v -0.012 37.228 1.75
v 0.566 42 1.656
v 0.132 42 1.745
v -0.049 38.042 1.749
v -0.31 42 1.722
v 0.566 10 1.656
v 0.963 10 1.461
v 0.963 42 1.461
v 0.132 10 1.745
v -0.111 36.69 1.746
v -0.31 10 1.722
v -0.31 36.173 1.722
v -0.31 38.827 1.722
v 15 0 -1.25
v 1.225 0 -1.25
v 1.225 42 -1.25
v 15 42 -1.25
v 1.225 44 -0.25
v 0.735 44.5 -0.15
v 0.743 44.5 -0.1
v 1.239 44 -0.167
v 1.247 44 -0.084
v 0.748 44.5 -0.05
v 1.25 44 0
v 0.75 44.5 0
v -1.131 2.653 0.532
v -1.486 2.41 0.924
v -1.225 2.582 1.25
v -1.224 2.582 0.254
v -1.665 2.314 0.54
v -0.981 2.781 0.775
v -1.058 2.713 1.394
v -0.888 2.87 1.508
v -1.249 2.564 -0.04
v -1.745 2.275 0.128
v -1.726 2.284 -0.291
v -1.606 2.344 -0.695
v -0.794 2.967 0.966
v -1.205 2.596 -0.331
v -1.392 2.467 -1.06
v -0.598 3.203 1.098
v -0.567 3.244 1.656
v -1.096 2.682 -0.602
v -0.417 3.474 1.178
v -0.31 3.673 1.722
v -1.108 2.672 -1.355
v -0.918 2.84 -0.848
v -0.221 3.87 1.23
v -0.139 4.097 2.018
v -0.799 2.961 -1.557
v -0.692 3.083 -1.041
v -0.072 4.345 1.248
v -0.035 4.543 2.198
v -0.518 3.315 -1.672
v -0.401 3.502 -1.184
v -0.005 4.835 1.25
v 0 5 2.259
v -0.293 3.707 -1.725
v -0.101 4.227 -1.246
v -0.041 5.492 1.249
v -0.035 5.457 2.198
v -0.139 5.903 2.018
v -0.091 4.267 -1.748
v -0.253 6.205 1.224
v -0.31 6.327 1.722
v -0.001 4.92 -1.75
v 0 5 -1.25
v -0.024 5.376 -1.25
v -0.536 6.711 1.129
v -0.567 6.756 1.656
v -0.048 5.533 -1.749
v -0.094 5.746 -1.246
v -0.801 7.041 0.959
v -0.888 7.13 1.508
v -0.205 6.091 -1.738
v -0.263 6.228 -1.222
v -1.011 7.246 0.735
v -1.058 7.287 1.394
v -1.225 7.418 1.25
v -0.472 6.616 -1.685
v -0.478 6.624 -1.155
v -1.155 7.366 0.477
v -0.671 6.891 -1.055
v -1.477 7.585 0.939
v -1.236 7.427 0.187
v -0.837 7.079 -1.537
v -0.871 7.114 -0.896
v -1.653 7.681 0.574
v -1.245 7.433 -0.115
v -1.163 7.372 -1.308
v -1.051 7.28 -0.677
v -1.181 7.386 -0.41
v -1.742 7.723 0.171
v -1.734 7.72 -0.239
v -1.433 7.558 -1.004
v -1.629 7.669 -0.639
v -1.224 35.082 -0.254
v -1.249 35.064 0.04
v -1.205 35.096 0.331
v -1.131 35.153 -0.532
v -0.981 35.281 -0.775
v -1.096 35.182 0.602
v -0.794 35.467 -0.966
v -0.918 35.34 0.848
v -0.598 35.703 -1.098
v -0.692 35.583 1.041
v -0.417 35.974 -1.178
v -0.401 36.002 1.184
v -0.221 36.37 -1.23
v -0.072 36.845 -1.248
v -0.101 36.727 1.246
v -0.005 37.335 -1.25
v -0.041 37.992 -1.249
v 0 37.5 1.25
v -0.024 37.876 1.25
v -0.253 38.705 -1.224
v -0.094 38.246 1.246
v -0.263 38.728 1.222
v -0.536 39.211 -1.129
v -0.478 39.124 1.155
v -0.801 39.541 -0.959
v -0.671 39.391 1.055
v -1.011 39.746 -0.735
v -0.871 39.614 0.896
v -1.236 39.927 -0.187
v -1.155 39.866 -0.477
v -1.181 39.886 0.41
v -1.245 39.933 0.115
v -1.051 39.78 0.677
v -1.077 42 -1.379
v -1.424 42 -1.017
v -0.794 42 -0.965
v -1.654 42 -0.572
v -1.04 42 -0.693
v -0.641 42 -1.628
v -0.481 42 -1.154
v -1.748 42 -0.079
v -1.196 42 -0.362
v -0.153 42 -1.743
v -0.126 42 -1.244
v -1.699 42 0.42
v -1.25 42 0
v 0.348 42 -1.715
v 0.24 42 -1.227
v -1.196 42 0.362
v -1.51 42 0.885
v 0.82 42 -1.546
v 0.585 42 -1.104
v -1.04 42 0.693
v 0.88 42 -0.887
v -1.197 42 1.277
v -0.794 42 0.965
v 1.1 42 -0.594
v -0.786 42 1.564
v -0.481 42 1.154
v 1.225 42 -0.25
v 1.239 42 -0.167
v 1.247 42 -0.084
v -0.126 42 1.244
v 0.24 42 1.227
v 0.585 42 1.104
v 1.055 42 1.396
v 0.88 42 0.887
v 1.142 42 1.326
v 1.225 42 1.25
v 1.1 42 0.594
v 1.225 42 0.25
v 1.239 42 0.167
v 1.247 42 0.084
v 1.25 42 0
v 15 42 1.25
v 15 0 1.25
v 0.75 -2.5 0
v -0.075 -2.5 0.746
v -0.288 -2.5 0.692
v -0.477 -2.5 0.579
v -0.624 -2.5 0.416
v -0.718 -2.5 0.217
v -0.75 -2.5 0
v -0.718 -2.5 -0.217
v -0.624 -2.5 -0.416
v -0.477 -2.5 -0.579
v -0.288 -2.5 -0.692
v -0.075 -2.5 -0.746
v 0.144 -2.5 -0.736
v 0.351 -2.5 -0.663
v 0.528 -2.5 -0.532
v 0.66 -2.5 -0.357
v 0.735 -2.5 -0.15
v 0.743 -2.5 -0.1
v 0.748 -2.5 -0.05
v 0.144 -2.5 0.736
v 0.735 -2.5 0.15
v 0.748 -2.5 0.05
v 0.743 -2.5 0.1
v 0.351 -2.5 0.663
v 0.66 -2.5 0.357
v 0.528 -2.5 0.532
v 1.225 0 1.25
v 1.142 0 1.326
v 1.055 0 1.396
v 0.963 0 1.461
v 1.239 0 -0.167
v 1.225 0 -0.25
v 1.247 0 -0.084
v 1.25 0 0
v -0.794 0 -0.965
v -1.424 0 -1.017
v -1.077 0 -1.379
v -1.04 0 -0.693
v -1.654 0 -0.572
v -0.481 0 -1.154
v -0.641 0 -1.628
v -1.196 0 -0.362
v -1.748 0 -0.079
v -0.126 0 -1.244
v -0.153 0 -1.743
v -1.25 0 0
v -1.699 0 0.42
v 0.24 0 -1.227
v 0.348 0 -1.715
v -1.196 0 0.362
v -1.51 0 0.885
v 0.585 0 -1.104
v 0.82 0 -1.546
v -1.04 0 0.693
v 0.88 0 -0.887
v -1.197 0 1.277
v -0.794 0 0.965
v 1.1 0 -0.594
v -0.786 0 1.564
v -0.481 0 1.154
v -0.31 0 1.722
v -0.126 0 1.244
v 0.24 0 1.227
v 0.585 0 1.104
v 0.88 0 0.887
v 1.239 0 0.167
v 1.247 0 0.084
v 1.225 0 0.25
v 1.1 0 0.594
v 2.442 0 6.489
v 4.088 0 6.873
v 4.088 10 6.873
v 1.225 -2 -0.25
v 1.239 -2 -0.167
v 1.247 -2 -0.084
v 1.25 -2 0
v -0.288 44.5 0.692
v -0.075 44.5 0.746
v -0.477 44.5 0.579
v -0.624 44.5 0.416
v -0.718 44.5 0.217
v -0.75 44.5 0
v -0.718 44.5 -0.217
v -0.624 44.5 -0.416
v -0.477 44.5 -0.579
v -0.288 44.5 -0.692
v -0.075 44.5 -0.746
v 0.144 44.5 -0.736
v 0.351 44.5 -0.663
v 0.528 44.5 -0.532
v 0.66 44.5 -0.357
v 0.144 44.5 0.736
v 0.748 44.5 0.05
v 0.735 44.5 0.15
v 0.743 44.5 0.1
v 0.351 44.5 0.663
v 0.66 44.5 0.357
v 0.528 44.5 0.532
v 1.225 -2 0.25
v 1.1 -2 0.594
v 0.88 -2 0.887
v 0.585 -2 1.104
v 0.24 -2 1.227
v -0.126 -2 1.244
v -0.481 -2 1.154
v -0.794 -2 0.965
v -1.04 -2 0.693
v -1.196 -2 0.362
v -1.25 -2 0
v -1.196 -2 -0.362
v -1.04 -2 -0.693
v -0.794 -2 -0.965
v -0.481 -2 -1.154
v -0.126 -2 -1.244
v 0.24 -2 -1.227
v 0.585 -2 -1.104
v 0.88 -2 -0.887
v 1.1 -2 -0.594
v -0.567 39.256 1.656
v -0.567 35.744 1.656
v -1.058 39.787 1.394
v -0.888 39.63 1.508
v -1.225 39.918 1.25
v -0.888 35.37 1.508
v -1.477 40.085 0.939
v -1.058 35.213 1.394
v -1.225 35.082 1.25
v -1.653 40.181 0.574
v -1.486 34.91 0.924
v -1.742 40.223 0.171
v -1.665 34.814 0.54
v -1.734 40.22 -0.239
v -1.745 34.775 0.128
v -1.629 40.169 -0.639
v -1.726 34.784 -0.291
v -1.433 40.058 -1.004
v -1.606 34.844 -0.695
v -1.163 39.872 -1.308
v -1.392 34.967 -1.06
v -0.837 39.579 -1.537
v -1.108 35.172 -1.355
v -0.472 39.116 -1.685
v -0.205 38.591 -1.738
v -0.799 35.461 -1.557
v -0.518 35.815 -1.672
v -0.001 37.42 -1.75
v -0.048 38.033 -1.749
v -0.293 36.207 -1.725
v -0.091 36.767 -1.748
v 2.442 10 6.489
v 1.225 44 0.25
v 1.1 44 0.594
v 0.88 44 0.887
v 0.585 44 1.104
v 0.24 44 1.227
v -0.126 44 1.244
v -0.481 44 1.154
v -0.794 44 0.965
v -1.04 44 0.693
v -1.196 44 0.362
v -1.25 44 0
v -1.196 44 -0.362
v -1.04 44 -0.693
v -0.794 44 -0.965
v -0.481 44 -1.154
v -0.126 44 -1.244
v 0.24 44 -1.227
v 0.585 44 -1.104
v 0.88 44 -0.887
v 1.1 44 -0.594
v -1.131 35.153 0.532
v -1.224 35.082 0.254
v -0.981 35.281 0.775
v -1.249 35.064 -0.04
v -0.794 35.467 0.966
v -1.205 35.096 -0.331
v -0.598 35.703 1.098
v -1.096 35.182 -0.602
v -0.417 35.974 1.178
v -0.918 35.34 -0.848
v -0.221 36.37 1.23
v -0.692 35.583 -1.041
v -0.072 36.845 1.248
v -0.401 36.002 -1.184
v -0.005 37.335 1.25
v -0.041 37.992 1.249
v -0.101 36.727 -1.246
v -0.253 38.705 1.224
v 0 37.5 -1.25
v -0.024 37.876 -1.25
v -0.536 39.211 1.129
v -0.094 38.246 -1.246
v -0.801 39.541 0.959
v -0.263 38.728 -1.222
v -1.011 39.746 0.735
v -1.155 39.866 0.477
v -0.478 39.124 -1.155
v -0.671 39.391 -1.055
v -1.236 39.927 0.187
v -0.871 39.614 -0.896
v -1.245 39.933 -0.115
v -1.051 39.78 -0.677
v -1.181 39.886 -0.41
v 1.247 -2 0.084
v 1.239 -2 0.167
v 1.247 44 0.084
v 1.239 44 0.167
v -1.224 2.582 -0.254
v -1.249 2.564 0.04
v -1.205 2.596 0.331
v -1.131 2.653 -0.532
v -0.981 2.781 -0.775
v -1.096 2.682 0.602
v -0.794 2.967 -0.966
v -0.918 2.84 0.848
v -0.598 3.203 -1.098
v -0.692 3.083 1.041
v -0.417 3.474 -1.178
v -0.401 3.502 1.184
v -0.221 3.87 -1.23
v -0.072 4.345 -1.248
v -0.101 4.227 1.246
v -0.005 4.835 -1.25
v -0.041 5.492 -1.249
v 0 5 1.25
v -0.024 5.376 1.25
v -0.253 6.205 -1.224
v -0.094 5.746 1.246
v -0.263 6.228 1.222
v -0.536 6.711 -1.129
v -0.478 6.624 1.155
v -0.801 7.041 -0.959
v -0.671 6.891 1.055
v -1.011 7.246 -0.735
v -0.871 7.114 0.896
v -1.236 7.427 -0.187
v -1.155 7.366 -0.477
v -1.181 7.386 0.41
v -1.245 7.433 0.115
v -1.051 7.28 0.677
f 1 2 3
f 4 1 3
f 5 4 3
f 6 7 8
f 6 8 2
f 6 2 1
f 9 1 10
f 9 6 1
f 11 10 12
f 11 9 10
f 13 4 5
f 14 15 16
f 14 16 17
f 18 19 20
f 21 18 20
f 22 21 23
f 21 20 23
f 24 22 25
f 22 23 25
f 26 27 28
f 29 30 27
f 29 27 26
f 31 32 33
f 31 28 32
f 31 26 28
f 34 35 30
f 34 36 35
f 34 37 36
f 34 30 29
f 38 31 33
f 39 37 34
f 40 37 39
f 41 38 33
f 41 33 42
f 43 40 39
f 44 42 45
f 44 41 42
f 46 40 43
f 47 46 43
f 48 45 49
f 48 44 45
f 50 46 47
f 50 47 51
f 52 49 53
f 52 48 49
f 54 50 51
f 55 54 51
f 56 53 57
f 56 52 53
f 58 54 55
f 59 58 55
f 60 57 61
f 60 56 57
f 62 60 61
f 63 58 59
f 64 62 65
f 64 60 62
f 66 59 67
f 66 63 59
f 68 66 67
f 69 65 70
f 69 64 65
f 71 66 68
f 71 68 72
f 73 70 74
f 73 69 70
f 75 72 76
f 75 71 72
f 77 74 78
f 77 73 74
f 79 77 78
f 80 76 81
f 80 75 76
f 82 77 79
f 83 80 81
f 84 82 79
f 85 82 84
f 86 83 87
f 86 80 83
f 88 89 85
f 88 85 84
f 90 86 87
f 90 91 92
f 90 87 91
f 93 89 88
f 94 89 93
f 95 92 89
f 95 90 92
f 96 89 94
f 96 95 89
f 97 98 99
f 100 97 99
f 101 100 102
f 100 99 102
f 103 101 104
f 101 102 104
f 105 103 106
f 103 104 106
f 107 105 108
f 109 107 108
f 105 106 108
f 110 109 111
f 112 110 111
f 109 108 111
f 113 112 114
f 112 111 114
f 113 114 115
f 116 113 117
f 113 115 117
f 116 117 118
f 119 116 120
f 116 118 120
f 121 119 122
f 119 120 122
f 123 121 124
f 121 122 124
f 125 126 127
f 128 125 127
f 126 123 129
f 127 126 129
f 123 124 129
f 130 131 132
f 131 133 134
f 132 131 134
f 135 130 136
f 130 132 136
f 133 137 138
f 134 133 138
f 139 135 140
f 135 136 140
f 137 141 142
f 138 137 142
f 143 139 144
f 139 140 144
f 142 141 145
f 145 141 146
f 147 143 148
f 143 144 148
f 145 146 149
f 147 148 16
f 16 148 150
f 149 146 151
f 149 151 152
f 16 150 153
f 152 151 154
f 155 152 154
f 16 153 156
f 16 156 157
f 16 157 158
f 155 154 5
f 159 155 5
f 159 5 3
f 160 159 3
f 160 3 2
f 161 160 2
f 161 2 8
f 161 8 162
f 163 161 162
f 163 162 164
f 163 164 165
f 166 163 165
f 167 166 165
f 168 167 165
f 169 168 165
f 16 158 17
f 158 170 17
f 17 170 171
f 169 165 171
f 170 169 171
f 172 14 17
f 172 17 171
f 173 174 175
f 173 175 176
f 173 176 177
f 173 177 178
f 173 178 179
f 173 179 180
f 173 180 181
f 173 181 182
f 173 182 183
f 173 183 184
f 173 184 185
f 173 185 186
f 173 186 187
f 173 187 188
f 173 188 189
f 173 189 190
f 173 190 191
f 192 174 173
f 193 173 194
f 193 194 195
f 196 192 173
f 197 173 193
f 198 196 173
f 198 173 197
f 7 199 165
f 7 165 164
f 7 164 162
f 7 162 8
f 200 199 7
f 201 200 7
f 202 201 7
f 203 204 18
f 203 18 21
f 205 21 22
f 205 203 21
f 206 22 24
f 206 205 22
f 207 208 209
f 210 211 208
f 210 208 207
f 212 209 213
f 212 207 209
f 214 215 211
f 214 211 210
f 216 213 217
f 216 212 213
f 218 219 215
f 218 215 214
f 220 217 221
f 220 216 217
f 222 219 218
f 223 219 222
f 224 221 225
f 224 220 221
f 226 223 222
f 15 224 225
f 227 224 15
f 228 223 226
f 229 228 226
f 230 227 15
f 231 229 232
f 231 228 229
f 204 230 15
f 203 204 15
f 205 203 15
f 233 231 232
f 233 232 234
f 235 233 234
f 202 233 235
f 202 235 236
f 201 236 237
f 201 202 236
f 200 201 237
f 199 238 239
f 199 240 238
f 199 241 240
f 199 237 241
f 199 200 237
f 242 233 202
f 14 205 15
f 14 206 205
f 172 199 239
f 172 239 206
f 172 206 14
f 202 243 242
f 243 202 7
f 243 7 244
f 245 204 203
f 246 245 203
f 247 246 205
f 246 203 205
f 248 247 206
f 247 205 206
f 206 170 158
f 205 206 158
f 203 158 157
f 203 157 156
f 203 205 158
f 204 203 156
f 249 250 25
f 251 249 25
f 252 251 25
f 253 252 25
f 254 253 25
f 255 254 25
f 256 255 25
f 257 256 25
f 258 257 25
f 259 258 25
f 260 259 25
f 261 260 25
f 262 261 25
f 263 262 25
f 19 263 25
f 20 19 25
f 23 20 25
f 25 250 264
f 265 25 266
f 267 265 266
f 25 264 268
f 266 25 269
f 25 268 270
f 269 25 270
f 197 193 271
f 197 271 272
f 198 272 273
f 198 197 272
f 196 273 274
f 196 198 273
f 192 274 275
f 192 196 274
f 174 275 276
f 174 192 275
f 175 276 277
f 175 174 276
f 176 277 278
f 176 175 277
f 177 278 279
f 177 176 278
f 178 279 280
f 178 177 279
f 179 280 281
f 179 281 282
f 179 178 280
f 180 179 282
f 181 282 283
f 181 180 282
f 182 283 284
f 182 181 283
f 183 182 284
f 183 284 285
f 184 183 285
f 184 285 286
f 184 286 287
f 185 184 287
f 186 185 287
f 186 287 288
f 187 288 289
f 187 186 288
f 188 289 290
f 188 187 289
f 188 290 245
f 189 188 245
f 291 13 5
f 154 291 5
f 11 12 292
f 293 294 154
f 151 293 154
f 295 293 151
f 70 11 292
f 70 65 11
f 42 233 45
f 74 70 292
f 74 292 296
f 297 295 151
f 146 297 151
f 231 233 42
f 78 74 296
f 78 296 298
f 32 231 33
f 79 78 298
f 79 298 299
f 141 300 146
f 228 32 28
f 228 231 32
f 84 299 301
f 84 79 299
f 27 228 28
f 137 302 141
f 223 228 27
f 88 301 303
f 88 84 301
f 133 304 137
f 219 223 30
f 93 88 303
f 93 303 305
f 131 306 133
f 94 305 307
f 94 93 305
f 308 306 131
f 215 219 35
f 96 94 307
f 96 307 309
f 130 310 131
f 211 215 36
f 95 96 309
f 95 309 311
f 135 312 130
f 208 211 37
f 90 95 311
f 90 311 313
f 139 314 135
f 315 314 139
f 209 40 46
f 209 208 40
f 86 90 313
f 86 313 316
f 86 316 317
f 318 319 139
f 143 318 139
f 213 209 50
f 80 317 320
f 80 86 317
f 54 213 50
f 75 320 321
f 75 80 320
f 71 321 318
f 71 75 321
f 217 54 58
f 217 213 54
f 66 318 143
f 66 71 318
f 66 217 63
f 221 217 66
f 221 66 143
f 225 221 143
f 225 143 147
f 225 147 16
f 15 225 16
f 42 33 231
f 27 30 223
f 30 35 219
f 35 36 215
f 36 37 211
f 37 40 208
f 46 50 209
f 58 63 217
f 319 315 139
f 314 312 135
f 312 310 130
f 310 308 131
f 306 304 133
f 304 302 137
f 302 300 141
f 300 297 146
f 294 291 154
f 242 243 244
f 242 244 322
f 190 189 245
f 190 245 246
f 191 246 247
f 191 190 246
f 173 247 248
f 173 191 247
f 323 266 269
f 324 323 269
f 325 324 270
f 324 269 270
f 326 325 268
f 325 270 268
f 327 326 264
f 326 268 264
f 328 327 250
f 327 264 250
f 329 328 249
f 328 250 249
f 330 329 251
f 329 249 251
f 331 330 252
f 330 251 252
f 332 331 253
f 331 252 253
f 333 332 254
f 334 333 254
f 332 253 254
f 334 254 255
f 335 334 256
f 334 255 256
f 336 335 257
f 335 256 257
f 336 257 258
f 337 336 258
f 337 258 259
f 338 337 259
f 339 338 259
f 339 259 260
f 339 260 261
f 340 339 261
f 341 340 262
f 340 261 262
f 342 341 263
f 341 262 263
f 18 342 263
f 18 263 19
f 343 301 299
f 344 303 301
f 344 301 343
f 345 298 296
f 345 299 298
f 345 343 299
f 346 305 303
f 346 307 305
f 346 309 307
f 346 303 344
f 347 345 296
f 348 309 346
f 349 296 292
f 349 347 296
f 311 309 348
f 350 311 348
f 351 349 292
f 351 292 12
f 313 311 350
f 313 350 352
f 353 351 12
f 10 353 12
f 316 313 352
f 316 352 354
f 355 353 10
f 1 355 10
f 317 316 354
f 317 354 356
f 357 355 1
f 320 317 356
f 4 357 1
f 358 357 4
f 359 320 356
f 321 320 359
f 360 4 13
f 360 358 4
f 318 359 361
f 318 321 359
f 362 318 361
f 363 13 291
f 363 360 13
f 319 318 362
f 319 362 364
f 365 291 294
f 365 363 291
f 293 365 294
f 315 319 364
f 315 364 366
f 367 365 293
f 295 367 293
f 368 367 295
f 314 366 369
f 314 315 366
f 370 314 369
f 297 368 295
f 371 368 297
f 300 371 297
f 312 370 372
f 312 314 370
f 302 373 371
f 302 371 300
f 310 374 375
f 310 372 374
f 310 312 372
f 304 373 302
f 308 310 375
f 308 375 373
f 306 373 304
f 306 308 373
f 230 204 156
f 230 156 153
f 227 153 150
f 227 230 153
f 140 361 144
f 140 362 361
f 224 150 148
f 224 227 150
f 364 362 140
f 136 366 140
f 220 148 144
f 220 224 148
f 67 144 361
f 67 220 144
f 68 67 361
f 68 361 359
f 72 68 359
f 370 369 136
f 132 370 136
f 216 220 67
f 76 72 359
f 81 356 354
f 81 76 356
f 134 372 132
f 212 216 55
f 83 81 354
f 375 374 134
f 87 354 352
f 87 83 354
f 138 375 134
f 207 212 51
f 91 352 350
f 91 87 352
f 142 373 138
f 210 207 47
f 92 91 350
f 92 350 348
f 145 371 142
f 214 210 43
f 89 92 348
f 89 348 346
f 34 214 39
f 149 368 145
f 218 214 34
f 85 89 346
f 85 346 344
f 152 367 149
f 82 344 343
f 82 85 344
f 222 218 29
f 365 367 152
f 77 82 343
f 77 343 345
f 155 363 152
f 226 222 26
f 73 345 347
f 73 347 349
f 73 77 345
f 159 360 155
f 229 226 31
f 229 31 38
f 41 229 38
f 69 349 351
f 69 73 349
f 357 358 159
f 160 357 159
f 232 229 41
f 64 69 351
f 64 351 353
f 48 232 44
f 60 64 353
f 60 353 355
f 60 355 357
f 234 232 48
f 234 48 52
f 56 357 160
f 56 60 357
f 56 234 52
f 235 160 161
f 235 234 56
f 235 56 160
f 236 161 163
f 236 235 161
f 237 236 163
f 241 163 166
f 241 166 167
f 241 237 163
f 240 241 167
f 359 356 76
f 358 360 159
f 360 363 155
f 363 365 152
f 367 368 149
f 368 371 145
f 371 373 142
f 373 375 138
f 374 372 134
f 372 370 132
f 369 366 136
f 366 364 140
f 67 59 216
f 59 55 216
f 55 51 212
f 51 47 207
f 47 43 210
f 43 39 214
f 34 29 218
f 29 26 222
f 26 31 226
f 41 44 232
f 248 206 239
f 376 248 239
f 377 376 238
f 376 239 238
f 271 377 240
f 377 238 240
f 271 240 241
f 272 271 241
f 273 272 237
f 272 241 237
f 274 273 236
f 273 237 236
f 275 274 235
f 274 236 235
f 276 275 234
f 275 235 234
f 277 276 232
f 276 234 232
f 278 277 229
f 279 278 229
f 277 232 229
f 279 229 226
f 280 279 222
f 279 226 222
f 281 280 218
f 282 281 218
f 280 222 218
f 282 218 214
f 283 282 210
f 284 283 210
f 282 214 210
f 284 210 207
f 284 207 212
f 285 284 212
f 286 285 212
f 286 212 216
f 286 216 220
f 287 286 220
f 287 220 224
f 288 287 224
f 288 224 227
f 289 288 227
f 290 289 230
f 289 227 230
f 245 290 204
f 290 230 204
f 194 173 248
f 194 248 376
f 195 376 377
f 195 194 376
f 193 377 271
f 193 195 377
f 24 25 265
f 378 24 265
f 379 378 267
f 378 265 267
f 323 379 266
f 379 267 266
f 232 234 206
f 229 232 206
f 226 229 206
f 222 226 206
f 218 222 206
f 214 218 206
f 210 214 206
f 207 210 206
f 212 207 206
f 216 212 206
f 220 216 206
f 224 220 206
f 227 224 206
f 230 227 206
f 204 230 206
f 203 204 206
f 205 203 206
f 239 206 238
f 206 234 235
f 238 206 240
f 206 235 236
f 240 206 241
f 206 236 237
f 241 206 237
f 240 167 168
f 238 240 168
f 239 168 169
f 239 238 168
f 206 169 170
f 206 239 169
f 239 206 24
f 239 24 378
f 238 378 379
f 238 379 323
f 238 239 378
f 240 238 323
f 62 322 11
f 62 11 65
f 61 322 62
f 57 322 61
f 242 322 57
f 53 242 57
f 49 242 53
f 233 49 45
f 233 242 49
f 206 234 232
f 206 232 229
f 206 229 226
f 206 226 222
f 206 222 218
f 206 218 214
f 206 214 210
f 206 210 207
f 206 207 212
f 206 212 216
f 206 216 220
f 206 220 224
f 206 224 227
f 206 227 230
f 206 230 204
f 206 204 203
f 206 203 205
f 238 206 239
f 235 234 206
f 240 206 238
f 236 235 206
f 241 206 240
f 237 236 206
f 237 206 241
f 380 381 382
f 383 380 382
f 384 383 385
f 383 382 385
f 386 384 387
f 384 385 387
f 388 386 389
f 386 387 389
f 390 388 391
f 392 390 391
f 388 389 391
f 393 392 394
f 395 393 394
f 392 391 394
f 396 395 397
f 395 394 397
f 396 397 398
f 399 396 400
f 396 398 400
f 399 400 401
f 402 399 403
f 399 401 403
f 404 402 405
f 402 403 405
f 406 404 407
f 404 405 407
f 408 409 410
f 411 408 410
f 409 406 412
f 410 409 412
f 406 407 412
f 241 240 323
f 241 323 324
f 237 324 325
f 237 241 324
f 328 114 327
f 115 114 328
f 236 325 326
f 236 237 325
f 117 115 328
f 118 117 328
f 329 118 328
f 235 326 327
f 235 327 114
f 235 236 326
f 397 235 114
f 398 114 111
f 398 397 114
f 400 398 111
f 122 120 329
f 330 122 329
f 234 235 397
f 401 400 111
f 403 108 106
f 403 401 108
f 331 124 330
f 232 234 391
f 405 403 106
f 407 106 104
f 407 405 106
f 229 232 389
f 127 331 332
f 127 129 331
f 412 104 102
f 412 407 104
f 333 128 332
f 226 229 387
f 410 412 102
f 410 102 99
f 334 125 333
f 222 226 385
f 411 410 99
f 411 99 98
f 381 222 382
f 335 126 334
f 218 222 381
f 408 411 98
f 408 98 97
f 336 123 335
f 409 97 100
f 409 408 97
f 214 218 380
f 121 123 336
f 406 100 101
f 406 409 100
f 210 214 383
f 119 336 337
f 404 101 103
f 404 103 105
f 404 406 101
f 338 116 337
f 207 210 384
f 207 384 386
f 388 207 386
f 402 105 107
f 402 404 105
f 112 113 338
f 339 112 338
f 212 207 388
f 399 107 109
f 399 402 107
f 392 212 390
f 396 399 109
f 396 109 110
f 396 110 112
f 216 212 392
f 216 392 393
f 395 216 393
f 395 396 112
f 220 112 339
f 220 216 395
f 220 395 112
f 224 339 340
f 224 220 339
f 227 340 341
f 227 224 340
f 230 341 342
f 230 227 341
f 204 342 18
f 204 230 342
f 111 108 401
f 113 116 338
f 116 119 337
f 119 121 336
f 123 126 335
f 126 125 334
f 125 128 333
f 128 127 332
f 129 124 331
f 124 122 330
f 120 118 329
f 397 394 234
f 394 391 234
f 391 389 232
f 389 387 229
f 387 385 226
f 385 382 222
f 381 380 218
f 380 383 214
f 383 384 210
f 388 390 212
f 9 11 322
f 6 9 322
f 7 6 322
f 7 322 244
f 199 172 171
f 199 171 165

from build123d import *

# Parameters (mm, degrees)
F1_DEPTH      = 2.5
F2_SIZE       = 0.5
F3_DEPTH      = 42
F4_DEPTH      = 44.5
F5_SIZE       = 0.5
F7_DEPTH      = 10
F6_R          = 3
F8_DEPTH      = 10
F8_DEPTH_BACK = 10


with BuildPart() as f1:
    # F0 (on Front) → F1 (new body)
    with BuildSketch(Plane.XZ):
        with BuildLine():
            Line((1.2247448714, -0.25), (1.2247448714, 0.25))
            ThreePointArc((1.2247448714, 0.25), (-1.25, 0), (1.2247448714, -0.25))
        make_face()
        with BuildLine():
            ThreePointArc((1.25, 0), (1.2436701913, 0.1256362025), (1.2247448714, 0.25))
            Line((1.2247448714, 0.25), (1.2247448714, -0.25))
            ThreePointArc((1.2247448714, -0.25), (1.2436701913, -0.1256362025), (1.25, 0))
        make_face()
    extrude(amount=F1_DEPTH)

    # F2
    f2_edges = [f1.edges().sort_by_distance(p)[0] for p in [
        (-1.224745, -2.5, 0.25),
    ]]
    chamfer(f2_edges, length=F2_SIZE)

    # F0 (on Front) → F3 (join)
    with BuildSketch(Plane.XZ):
        with BuildLine():
            ThreePointArc((1.2247448714, 1.25), (1.6133510971, 0.6779367504), (1.75, 0))
            ThreePointArc((1.75, 0), (1.6133510971, -0.6779367504), (1.2247448714, -1.25))
            Line((1.2247448714, -1.25), (15, -1.25))
            Line((15, -1.25), (15, 1.25))
            Line((15, 1.25), (1.2247448714, 1.25))
        make_face()
        with BuildLine():
            Line((1.2247448714, 0.25), (1.2247448714, 1.25))
            ThreePointArc((1.2247448714, 1.25), (1.0990782163, 1.3618102197), (0.9632574662, 1.4610390323))
            ThreePointArc((0.9632574662, 1.4610390323), (0.3519402911, 1.7142456159), (-0.3096911027, 1.722379581))
            ThreePointArc((-0.3096911027, 1.722379581), (-1.5550212035, -0.8027509307), (1.2247448714, -1.25))
            Line((1.2247448714, -1.25), (1.2247448714, -0.25))
            ThreePointArc((1.2247448714, -0.25), (-1.25, 0), (1.2247448714, 0.25))
        make_face()
        with BuildLine():
            ThreePointArc((1.2247448714, -1.25), (1.6133510971, -0.6779367504), (1.75, 0))
            ThreePointArc((1.75, 0), (1.6133510971, 0.6779367504), (1.2247448714, 1.25))
            Line((1.2247448714, 1.25), (1.2247448714, 0.25))
            ThreePointArc((1.2247448714, 0.25), (1.2436701913, 0.1256362025), (1.25, 0))
            ThreePointArc((1.25, 0), (1.2436701913, -0.1256362025), (1.2247448714, -0.25))
            Line((1.2247448714, -0.25), (1.2247448714, -1.25))
        make_face()
    extrude(amount=-F3_DEPTH)

    # F0 (on Front) → F7 (join)
    with BuildSketch(Plane.XZ):
        with BuildLine():
            ThreePointArc((-0.3096911027, 1.722379581), (0.3519402911, 1.7142456159), (0.9632574662, 1.4610390323))
            Line((0.9632574662, 1.4610390323), (4.0880007002, 6.8732530742))
            Line((4.0880007002, 6.8732530742), (2.4424443742, 6.4892180562))
            Line((2.4424443742, 6.4892180562), (-0.3096911027, 1.722379581))
        make_face()
    extrude(amount=-F7_DEPTH)


with BuildPart() as f4:
    # F0 (on Front) → F4 (new body)
    with BuildSketch(Plane.XZ):
        with BuildLine():
            Line((1.2247448714, -0.25), (1.2247448714, 0.25))
            ThreePointArc((1.2247448714, 0.25), (-1.25, 0), (1.2247448714, -0.25))
        make_face()
        with BuildLine():
            ThreePointArc((1.25, 0), (1.2436701913, 0.1256362025), (1.2247448714, 0.25))
            Line((1.2247448714, 0.25), (1.2247448714, -0.25))
            ThreePointArc((1.2247448714, -0.25), (1.2436701913, -0.1256362025), (1.25, 0))
        make_face()
    extrude(amount=-F4_DEPTH)

    # F5
    f5_edges = [f4.edges().sort_by_distance(p)[0] for p in [
        (-1.224745, 44.5, 0.25),
    ]]
    chamfer(f5_edges, length=F5_SIZE)


with BuildPart() as f8_tool:
    # F6 (on face) → F8 (new body, two sides)
    with BuildSketch(Plane.XY.offset(1.25)) as f8_sk:
        with Locations((-3, 37.5)):
            Circle(F6_R)
        with Locations((-3, 5)):
            Circle(F6_R)
    extrude(amount=-F8_DEPTH)
    extrude(f8_sk.sketch, amount=F8_DEPTH_BACK)


with BuildPart() as f1_1:
    add(f1.part)

    # F8: cut by f8_tool
    add(f8_tool.part, mode=Mode.SUBTRACT)

    # F9: F1, F4 across face


with BuildPart() as f4_1:
    add(f4.part)

    # F8: cut by f8_tool
    add(f8_tool.part, mode=Mode.SUBTRACT)


with BuildPart() as f1_2:
    add(f1_1.part)
    add(f1_1.part.mirror(Plane(origin=(15, 21, 0), x_dir=(0, 1, 0), z_dir=(1, 0, 0))), mode=Mode.SUBTRACT)
    add(f4_1.part.mirror(Plane(origin=(15, 21, 0), x_dir=(0, 1, 0), z_dir=(1, 0, 0))), mode=Mode.SUBTRACT)


solid = Compound([f4_1.part, f1_2.part])
